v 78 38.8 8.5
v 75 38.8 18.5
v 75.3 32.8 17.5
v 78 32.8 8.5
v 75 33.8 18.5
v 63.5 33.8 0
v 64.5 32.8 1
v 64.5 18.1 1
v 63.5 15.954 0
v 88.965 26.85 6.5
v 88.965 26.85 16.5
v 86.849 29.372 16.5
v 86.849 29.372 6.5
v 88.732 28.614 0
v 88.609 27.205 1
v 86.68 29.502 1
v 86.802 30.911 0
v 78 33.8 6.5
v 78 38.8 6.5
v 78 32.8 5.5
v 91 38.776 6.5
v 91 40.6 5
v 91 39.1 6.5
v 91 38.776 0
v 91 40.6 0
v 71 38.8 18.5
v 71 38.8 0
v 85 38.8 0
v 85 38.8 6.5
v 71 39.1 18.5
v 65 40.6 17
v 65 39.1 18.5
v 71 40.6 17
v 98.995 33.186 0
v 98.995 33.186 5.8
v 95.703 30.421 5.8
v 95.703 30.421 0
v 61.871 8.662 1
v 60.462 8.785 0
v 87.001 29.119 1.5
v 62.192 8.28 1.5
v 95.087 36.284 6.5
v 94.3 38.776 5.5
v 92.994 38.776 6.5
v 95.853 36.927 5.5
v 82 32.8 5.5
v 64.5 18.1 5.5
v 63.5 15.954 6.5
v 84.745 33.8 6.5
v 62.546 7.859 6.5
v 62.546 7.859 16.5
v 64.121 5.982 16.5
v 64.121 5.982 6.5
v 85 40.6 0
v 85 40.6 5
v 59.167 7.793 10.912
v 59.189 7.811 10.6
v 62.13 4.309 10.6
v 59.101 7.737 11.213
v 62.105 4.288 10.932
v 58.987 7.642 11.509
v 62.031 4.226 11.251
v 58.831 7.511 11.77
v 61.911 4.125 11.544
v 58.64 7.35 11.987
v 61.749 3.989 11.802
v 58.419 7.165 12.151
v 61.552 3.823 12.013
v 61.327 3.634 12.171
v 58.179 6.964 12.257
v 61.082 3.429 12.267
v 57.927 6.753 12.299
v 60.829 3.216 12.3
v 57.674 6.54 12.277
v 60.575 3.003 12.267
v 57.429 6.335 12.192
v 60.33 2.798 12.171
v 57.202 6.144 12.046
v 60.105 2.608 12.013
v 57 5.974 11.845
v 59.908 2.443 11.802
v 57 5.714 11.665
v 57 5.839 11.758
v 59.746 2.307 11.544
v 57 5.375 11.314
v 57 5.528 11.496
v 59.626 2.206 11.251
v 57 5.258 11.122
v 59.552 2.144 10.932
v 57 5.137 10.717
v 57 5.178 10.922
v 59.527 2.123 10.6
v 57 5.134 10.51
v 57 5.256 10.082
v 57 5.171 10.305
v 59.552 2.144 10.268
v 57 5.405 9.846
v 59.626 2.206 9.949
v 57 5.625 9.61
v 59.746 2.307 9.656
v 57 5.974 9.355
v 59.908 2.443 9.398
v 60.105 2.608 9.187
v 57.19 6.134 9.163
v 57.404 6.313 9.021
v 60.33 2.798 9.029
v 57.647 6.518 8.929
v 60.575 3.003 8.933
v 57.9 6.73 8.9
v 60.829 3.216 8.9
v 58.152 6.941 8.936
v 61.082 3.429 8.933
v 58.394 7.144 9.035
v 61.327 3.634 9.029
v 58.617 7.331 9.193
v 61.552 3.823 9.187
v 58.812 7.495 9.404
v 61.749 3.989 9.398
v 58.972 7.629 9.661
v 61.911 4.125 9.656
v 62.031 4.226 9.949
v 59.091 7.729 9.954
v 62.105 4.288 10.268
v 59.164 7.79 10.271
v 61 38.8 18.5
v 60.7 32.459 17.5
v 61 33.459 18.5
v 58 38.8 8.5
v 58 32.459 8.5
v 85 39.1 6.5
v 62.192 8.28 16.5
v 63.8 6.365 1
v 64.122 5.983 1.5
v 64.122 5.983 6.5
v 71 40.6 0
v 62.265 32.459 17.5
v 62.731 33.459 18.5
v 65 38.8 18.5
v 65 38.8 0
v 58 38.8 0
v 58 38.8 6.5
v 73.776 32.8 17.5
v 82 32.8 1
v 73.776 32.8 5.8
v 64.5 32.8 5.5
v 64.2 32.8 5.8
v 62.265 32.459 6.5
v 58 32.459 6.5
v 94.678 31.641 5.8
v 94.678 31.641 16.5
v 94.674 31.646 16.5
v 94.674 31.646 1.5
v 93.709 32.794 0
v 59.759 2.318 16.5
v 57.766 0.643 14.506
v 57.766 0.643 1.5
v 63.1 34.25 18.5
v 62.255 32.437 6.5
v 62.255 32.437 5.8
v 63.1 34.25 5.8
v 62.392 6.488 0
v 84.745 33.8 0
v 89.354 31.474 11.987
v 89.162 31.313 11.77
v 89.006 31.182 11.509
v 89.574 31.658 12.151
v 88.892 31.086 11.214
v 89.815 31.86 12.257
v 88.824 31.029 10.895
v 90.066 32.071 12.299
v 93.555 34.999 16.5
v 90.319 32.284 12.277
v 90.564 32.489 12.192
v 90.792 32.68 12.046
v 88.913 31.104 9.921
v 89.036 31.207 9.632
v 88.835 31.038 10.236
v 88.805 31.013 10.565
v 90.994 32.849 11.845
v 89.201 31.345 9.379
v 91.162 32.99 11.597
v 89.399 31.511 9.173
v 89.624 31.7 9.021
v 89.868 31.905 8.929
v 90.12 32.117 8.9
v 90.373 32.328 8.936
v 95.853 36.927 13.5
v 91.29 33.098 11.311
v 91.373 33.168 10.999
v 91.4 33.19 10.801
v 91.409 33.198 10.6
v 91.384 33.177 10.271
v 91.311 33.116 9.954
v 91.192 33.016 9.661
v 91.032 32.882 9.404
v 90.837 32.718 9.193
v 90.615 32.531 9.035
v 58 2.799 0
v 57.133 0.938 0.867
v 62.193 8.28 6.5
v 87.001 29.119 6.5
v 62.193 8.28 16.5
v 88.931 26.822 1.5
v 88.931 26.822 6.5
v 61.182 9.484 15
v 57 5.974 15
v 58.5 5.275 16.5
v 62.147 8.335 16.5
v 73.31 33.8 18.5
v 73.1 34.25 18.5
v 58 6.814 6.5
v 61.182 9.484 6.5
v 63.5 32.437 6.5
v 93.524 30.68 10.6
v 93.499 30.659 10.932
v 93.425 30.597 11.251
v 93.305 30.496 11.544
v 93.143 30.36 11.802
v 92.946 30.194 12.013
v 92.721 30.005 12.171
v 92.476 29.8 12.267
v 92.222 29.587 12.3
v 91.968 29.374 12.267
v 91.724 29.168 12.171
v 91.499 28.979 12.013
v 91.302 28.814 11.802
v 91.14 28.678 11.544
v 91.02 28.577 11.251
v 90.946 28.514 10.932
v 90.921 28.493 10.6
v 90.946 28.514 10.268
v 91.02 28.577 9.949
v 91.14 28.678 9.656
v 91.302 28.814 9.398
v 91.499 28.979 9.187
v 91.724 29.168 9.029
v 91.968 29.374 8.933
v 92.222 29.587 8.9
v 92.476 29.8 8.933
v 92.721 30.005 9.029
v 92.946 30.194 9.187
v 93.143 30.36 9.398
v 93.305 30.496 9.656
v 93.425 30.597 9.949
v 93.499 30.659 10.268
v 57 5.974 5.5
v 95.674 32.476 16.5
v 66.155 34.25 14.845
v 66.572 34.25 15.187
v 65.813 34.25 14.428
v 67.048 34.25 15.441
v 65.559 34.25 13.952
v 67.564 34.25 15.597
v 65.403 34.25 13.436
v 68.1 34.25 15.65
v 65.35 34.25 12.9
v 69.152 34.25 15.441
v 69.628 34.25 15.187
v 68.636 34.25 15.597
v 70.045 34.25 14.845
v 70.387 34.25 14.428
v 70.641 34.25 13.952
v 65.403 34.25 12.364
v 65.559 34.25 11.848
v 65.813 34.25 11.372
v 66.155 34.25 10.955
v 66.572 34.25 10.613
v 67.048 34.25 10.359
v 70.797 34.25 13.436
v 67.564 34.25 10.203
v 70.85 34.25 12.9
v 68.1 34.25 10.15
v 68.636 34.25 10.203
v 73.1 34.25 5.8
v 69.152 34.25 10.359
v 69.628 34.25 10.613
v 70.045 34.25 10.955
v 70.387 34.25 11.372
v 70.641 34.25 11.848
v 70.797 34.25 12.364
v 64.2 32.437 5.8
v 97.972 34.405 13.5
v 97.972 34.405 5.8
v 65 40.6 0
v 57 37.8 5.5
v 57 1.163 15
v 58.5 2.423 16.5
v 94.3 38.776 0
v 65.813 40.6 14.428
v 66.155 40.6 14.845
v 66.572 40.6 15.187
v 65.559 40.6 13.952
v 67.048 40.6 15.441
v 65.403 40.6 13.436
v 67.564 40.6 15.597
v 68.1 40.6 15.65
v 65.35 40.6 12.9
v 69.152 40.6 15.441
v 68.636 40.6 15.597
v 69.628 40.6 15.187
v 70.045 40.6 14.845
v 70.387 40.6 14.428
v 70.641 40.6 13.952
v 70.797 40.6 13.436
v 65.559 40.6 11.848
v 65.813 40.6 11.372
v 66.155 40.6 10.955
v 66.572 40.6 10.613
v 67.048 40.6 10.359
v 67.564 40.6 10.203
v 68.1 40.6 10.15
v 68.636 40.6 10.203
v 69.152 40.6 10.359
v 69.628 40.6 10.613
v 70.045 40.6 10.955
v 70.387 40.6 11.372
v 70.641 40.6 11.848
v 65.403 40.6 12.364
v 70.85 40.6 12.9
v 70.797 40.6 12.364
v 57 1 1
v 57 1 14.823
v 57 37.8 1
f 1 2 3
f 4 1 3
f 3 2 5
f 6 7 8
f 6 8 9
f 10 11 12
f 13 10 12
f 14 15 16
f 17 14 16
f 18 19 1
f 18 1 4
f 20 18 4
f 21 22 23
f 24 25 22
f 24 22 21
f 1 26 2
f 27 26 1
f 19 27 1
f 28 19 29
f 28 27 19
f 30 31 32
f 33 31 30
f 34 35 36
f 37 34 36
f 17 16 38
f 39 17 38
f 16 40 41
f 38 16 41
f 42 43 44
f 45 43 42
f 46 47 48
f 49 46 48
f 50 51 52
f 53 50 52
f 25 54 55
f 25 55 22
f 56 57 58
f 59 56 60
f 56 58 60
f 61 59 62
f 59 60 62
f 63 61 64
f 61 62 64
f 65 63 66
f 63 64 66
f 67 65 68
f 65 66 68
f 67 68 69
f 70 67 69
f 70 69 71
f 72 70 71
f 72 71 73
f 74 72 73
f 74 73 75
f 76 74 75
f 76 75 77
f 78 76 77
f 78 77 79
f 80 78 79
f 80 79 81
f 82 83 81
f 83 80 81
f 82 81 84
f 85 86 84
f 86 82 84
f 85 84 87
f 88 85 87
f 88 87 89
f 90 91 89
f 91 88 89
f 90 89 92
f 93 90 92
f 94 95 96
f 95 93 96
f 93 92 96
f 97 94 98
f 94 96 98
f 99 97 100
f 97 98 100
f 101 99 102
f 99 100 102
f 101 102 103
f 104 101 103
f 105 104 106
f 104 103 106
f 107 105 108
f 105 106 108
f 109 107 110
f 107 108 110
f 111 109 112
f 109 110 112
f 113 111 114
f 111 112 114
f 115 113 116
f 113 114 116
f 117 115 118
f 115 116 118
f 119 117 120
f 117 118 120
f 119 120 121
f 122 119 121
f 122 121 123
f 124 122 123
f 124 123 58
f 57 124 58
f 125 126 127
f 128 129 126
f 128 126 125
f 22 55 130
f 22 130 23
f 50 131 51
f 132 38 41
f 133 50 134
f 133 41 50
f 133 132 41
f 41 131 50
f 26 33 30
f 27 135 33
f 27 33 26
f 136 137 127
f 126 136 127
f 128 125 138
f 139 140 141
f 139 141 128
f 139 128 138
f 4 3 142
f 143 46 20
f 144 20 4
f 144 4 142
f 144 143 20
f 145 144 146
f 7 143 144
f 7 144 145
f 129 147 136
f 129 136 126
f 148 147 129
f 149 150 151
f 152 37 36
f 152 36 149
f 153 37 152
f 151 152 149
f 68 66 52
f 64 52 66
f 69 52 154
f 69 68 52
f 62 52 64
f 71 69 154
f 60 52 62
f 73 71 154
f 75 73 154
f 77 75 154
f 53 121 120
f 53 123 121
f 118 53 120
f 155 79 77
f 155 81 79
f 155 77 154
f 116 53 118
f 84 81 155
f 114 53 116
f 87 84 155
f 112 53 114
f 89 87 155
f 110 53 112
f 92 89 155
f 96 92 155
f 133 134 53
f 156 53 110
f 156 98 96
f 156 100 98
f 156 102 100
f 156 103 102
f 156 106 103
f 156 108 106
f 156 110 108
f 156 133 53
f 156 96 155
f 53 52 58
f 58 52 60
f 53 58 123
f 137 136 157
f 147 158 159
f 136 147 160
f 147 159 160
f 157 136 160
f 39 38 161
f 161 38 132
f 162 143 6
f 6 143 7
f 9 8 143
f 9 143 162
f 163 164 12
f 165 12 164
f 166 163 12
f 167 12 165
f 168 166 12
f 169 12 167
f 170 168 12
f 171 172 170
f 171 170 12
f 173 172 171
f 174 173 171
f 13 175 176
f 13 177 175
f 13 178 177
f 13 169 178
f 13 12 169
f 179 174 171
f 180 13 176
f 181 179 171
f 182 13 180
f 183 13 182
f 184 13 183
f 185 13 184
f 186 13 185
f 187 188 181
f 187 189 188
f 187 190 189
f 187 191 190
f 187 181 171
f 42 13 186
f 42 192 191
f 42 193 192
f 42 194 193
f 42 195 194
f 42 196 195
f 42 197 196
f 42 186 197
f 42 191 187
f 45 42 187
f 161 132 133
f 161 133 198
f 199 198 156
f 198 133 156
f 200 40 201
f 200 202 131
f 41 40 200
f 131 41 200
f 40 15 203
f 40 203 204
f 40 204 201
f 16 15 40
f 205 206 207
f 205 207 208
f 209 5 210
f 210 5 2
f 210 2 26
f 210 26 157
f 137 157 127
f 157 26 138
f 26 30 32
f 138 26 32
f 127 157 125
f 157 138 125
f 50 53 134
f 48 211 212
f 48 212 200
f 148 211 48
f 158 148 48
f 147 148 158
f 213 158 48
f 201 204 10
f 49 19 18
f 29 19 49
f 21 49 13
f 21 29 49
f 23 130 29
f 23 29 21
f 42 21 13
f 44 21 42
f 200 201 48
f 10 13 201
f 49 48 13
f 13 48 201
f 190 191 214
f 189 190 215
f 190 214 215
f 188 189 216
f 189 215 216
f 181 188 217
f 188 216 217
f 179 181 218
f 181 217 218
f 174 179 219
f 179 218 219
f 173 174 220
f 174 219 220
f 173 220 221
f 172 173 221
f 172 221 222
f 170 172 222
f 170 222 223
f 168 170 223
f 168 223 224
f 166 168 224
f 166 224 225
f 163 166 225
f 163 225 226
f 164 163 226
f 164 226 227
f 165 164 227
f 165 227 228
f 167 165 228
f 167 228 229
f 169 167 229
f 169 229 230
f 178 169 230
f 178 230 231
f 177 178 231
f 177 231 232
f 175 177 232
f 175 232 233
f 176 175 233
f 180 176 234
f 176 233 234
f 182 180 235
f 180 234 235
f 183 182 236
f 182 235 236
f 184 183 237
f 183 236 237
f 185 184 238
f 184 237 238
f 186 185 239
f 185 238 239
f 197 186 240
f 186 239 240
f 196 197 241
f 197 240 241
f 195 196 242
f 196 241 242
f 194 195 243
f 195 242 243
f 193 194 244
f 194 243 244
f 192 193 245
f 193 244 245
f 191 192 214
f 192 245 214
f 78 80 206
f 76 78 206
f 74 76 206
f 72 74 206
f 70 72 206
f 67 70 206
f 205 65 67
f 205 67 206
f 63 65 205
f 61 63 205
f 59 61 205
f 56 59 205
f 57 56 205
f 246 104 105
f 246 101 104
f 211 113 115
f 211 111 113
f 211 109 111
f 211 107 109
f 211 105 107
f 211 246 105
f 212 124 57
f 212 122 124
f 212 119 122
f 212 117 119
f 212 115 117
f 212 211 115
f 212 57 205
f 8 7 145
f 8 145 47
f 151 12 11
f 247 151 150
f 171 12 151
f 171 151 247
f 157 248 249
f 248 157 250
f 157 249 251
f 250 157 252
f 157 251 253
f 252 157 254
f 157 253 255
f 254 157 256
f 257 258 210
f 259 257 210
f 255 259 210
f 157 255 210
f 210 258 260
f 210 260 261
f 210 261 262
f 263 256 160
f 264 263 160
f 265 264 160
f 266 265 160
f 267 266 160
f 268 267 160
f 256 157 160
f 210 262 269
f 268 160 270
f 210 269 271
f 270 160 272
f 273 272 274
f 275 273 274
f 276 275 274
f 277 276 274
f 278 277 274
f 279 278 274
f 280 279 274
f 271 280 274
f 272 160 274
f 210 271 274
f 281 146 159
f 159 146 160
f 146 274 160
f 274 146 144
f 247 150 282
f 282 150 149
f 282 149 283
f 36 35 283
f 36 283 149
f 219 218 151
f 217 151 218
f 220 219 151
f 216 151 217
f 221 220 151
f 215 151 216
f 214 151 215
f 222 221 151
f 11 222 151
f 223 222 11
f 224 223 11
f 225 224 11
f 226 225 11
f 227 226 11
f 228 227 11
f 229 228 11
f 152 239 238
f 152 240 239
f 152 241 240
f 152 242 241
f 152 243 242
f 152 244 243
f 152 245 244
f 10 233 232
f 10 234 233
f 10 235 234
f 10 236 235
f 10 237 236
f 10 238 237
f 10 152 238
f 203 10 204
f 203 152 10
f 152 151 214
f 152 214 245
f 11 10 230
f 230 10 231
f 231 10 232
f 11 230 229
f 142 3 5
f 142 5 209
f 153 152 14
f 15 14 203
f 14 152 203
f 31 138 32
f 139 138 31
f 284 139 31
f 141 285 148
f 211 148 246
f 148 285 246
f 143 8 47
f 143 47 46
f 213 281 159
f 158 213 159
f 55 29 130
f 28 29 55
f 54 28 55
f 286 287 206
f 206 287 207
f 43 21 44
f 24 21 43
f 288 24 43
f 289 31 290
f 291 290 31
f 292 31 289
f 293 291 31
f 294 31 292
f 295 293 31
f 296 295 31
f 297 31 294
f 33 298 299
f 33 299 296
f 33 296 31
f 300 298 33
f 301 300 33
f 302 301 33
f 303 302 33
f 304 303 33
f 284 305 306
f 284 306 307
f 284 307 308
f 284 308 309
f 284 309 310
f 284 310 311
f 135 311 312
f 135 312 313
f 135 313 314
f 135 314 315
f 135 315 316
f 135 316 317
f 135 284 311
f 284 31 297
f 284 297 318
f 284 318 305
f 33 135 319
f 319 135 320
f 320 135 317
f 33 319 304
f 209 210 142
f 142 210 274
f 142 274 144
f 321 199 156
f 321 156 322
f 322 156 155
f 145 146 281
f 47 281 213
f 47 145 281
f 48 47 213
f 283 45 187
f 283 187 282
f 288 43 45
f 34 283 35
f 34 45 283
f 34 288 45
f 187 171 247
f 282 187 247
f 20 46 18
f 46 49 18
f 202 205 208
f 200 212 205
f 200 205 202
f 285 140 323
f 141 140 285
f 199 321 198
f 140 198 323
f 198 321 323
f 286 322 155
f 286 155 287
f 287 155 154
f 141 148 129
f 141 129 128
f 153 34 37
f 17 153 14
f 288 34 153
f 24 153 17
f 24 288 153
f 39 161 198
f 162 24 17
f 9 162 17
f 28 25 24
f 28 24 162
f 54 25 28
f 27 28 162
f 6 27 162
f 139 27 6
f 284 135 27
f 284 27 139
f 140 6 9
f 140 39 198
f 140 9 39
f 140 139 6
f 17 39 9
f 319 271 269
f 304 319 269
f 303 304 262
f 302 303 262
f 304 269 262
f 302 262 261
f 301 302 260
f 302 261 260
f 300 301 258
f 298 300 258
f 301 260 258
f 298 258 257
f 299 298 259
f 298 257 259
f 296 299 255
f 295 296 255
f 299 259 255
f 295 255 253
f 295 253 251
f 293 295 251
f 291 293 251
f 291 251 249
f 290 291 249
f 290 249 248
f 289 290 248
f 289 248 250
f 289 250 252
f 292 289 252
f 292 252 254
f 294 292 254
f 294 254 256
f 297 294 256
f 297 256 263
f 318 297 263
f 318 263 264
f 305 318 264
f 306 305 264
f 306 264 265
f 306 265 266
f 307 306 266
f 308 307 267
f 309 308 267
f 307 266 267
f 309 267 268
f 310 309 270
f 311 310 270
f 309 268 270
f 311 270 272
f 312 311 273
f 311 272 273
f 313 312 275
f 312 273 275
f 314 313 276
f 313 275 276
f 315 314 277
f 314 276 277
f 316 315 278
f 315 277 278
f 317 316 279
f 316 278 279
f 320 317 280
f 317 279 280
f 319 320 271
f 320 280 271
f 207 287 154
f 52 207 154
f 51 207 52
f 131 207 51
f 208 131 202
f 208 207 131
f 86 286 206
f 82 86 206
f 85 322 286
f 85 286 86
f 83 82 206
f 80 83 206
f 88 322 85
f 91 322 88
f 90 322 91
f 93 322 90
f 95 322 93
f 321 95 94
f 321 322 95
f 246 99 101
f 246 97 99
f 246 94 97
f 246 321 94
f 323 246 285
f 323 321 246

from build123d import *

# Parameters (mm, degrees)
PAD020_DEPTH     = 18.5
POCKET047_DEPTH  = 13
POCKET048_DEPTH  = 5
POCKET049_DEPTH  = 15
SKETCH088_R      = 2.75
POCKET050_DEPTH  = 12
SKETCH089_R      = 1.7
POCKET051_DEPTH  = 5
CHAMFER_SIZE     = 3
CHAMFER036_SIZE2 = 3
CHAMFER036_SIZE  = 10
CHAMFER037_SIZE2 = 10
CHAMFER037_SIZE  = 3
CHAMFER038_SIZE  = 1
CHAMFER039_SIZE  = 1
CHAMFER040_SIZE  = 1.5
CHAMFER041_SIZE  = 1
CHAMFER042_SIZE  = 1
CHAMFER043_SIZE  = 1
CHAMFER044_SIZE  = 1
CHAMFER045_SIZE  = 1.5
CHAMFER046_SIZE  = 1
CHAMFER047_SIZE  = 1
CHAMFER048_SIZE  = 1.5
CHAMFER049_SIZE  = 1
CHAMFER050_SIZE  = 1


with BuildPart() as part:
    # Sketch084 → Pad020 (new body)
    with BuildSketch(Plane.XY):
        Polygon((0, 38.8), (8, 38.8), (8, 40.6), (14, 40.6), (14, 38.8), (28, 38.8), (28, 40.6), (34, 40.6), (34, 38.7761214391), (37.3, 38.7761214391), (41.9953022309, 33.1864759261), (38.7027713123, 30.4207499545), (37.673663974, 31.6458777382), (31.9308774881, 26.82193709), (30.0013012288, 29.1190516844), (5.1924636096, 8.2796280843), (7.1220398689, 5.9825134899), (0, 0), align=None)
        Polygon((7.5, 32.8), (7.5, 18.1), (25, 32.8), align=None, mode=Mode.SUBTRACT)
    extrude(amount=PAD020_DEPTH)

    # Sketch085 → Pocket047 (cut)
    with BuildSketch(Plane.XY.offset(6.5)):
        Polygon((0, 5.9744797055), (4.1823490341, 9.4838872374), (7.132775333, 5.967706096), (31.9875690904, 26.8233543707), (29.8491428651, 29.3718315072), (38.9102049805, 36.9749653863), (34.8909759819, 41.7648959848), (21, 41.7648959848), (21, 32.458794), (1, 32.458794), (1, 41.759258), (0, 41.764896), align=None)
    extrude(amount=POCKET047_DEPTH, mode=Mode.SUBTRACT)

    # Sketch086 → Pocket048 (cut)
    with BuildSketch(Plane.XY.offset(16.5)):
        Polygon((-0.8541061726, -4.3526620467), (49.194970654, 37.6434998606), (44.0526697777, 43.7718554052), (-5.9964070501, 1.7756934982), align=None)
    extrude(amount=POCKET048_DEPTH, mode=Mode.SUBTRACT)

    # Sketch087 → Pocket049 (cut)
    with BuildSketch(Plane.XY.offset(5.8)):
        Polygon((37.0972154509, 31.1536445146), (41.470166846, 34.8229864174), (44.3478623025, 31.3934825187), (39.9749109074, 27.724140616), align=None)
        Polygon((6.1, 34.25), (16.1, 34.25), (16.9452365235, 32.4373844259), (5.2547634765, 32.4373844259), align=None)
    extrude(amount=POCKET049_DEPTH, mode=Mode.SUBTRACT)

    # Sketch088 → Pocket050 (cut)
    with BuildSketch(Plane.XZ.offset(-30)):
        with Locations((11.1, 12.9)):
            Circle(SKETCH088_R)
    extrude(amount=-POCKET050_DEPTH, mode=Mode.SUBTRACT)

    # Sketch089 → Pocket051 (cut)
    with BuildSketch(Plane(origin=(0, 0, 0), x_dir=(0.7657048648, 0.6431920864, 0), z_dir=(0.6431920864, -0.7657048648, 0))):
        with Locations((5, 10.6)):
            Circle(SKETCH089_R)
        with Locations((46, 10.6)):
            Circle(SKETCH089_R)
    extrude(amount=-POCKET051_DEPTH, mode=Mode.SUBTRACT)

    # Chamfer
    chamfer_edges = [part.edges().sort_by_distance(p)[0] for p in [
        (39.912516, 35.665983, 16.5),
    ]]
    chamfer(chamfer_edges, length=CHAMFER_SIZE)

    # Chamfer036
    chamfer036_edges = [part.edges().sort_by_distance(p)[0] for p in [
        (21, 35.8, 18.5),
    ]]
    chamfer036_side = part.faces().sort_by_distance((21, 35.8, 12.5))[0]
    chamfer(chamfer036_edges, length=CHAMFER036_SIZE, length2=CHAMFER036_SIZE2, reference=chamfer036_side)

    # Chamfer037
    chamfer037_edges = [part.edges().sort_by_distance(p)[0] for p in [
        (1, 35.629397, 18.5),
    ]]
    chamfer037_side = part.faces().sort_by_distance((9.318343, 36.537604, 18.5))[0]
    chamfer(chamfer037_edges, length=CHAMFER037_SIZE, length2=CHAMFER037_SIZE2, reference=chamfer037_side)

    # Chamfer038
    chamfer038_edges = [part.edges().sort_by_distance(p)[0] for p in [
        (16.25, 25.45, 6.5),
        (7.5, 25.268692, 6.5),
        (23, 32.8, 6.5),
    ]]
    chamfer(chamfer038_edges, length=CHAMFER038_SIZE)

    # Chamfer039
    chamfer039_edges = [part.edges().sort_by_distance(p)[0] for p in [
        (17.388073, 32.8, 18.5),
        (4.632373, 32.458794, 18.5),
    ]]
    chamfer(chamfer039_edges, length=CHAMFER039_SIZE)

    # Chamfer040
    chamfer040_edges = [part.edges().sort_by_distance(p)[0] for p in [
        (31, 40.6, 6.5),
        (11, 40.6, 18.5),
    ]]
    chamfer(chamfer040_edges, length=CHAMFER040_SIZE)

    # Chamfer041
    chamfer041_edges = [part.edges().sort_by_distance(p)[0] for p in [
        (38.076586, 37.851615, 6.5),
    ]]
    chamfer(chamfer041_edges, length=CHAMFER041_SIZE)

    # Chamfer042
    chamfer042_edges = [part.edges().sort_by_distance(p)[0] for p in [
        (0, 22.38724, 6.5),
        (0, 19.4, 0),
    ]]
    chamfer(chamfer042_edges, length=CHAMFER042_SIZE)

    # Chamfer043
    chamfer043_edges = [part.edges().sort_by_distance(p)[0] for p in [
        (0, 38.8, 3.25),
    ]]
    chamfer(chamfer043_edges, length=CHAMFER043_SIZE)

    # Chamfer044
    chamfer044_edges = [part.edges().sort_by_distance(p)[0] for p in [
        (0, 0, 8.75),
    ]]
    chamfer(chamfer044_edges, length=CHAMFER044_SIZE)

    # Chamfer045
    chamfer045_edges = [part.edges().sort_by_distance(p)[0] for p in [
        (2.091175, 7.729183, 16.5),
        (0, 3.48724, 16.5),
    ]]
    chamfer(chamfer045_edges, length=CHAMFER045_SIZE)

    # Chamfer046
    chamfer046_edges = [part.edges().sort_by_distance(p)[0] for p in [
        (1.132852, 0.951596, 16.132852),
    ]]
    chamfer(chamfer046_edges, length=CHAMFER046_SIZE)

    # Chamfer047
    chamfer047_edges = [part.edges().sort_by_distance(p)[0] for p in [
        (16.25, 25.45, 0),
        (16.25, 32.8, 0),
        (7.5, 25.45, 0),
    ]]
    chamfer(chamfer047_edges, length=CHAMFER047_SIZE)

    # Chamfer048
    chamfer048_edges = [part.edges().sort_by_distance(p)[0] for p in [
        (4.06102, 3.411257, 0),
        (17.596882, 18.69934, 0),
        (34.802271, 29.233907, 0),
    ]]
    chamfer(chamfer048_edges, length=CHAMFER048_SIZE)

    # Chamfer049
    chamfer049_edges = [part.edges().sort_by_distance(p)[0] for p in [
        (30.483695, 28.544773, 0),
        (29.518907, 29.69333, 0),
    ]]
    chamfer(chamfer049_edges, length=CHAMFER049_SIZE)

    # Chamfer050
    chamfer050_edges = [part.edges().sort_by_distance(p)[0] for p in [
        (4.71007, 8.853907, 0),
    ]]
    chamfer(chamfer050_edges, length=CHAMFER050_SIZE)


with BuildPart() as part_1:
    # Body016 placement: moved
    add(part.part.moved(Location((57, 0, 0))))


solid = part_1.part
